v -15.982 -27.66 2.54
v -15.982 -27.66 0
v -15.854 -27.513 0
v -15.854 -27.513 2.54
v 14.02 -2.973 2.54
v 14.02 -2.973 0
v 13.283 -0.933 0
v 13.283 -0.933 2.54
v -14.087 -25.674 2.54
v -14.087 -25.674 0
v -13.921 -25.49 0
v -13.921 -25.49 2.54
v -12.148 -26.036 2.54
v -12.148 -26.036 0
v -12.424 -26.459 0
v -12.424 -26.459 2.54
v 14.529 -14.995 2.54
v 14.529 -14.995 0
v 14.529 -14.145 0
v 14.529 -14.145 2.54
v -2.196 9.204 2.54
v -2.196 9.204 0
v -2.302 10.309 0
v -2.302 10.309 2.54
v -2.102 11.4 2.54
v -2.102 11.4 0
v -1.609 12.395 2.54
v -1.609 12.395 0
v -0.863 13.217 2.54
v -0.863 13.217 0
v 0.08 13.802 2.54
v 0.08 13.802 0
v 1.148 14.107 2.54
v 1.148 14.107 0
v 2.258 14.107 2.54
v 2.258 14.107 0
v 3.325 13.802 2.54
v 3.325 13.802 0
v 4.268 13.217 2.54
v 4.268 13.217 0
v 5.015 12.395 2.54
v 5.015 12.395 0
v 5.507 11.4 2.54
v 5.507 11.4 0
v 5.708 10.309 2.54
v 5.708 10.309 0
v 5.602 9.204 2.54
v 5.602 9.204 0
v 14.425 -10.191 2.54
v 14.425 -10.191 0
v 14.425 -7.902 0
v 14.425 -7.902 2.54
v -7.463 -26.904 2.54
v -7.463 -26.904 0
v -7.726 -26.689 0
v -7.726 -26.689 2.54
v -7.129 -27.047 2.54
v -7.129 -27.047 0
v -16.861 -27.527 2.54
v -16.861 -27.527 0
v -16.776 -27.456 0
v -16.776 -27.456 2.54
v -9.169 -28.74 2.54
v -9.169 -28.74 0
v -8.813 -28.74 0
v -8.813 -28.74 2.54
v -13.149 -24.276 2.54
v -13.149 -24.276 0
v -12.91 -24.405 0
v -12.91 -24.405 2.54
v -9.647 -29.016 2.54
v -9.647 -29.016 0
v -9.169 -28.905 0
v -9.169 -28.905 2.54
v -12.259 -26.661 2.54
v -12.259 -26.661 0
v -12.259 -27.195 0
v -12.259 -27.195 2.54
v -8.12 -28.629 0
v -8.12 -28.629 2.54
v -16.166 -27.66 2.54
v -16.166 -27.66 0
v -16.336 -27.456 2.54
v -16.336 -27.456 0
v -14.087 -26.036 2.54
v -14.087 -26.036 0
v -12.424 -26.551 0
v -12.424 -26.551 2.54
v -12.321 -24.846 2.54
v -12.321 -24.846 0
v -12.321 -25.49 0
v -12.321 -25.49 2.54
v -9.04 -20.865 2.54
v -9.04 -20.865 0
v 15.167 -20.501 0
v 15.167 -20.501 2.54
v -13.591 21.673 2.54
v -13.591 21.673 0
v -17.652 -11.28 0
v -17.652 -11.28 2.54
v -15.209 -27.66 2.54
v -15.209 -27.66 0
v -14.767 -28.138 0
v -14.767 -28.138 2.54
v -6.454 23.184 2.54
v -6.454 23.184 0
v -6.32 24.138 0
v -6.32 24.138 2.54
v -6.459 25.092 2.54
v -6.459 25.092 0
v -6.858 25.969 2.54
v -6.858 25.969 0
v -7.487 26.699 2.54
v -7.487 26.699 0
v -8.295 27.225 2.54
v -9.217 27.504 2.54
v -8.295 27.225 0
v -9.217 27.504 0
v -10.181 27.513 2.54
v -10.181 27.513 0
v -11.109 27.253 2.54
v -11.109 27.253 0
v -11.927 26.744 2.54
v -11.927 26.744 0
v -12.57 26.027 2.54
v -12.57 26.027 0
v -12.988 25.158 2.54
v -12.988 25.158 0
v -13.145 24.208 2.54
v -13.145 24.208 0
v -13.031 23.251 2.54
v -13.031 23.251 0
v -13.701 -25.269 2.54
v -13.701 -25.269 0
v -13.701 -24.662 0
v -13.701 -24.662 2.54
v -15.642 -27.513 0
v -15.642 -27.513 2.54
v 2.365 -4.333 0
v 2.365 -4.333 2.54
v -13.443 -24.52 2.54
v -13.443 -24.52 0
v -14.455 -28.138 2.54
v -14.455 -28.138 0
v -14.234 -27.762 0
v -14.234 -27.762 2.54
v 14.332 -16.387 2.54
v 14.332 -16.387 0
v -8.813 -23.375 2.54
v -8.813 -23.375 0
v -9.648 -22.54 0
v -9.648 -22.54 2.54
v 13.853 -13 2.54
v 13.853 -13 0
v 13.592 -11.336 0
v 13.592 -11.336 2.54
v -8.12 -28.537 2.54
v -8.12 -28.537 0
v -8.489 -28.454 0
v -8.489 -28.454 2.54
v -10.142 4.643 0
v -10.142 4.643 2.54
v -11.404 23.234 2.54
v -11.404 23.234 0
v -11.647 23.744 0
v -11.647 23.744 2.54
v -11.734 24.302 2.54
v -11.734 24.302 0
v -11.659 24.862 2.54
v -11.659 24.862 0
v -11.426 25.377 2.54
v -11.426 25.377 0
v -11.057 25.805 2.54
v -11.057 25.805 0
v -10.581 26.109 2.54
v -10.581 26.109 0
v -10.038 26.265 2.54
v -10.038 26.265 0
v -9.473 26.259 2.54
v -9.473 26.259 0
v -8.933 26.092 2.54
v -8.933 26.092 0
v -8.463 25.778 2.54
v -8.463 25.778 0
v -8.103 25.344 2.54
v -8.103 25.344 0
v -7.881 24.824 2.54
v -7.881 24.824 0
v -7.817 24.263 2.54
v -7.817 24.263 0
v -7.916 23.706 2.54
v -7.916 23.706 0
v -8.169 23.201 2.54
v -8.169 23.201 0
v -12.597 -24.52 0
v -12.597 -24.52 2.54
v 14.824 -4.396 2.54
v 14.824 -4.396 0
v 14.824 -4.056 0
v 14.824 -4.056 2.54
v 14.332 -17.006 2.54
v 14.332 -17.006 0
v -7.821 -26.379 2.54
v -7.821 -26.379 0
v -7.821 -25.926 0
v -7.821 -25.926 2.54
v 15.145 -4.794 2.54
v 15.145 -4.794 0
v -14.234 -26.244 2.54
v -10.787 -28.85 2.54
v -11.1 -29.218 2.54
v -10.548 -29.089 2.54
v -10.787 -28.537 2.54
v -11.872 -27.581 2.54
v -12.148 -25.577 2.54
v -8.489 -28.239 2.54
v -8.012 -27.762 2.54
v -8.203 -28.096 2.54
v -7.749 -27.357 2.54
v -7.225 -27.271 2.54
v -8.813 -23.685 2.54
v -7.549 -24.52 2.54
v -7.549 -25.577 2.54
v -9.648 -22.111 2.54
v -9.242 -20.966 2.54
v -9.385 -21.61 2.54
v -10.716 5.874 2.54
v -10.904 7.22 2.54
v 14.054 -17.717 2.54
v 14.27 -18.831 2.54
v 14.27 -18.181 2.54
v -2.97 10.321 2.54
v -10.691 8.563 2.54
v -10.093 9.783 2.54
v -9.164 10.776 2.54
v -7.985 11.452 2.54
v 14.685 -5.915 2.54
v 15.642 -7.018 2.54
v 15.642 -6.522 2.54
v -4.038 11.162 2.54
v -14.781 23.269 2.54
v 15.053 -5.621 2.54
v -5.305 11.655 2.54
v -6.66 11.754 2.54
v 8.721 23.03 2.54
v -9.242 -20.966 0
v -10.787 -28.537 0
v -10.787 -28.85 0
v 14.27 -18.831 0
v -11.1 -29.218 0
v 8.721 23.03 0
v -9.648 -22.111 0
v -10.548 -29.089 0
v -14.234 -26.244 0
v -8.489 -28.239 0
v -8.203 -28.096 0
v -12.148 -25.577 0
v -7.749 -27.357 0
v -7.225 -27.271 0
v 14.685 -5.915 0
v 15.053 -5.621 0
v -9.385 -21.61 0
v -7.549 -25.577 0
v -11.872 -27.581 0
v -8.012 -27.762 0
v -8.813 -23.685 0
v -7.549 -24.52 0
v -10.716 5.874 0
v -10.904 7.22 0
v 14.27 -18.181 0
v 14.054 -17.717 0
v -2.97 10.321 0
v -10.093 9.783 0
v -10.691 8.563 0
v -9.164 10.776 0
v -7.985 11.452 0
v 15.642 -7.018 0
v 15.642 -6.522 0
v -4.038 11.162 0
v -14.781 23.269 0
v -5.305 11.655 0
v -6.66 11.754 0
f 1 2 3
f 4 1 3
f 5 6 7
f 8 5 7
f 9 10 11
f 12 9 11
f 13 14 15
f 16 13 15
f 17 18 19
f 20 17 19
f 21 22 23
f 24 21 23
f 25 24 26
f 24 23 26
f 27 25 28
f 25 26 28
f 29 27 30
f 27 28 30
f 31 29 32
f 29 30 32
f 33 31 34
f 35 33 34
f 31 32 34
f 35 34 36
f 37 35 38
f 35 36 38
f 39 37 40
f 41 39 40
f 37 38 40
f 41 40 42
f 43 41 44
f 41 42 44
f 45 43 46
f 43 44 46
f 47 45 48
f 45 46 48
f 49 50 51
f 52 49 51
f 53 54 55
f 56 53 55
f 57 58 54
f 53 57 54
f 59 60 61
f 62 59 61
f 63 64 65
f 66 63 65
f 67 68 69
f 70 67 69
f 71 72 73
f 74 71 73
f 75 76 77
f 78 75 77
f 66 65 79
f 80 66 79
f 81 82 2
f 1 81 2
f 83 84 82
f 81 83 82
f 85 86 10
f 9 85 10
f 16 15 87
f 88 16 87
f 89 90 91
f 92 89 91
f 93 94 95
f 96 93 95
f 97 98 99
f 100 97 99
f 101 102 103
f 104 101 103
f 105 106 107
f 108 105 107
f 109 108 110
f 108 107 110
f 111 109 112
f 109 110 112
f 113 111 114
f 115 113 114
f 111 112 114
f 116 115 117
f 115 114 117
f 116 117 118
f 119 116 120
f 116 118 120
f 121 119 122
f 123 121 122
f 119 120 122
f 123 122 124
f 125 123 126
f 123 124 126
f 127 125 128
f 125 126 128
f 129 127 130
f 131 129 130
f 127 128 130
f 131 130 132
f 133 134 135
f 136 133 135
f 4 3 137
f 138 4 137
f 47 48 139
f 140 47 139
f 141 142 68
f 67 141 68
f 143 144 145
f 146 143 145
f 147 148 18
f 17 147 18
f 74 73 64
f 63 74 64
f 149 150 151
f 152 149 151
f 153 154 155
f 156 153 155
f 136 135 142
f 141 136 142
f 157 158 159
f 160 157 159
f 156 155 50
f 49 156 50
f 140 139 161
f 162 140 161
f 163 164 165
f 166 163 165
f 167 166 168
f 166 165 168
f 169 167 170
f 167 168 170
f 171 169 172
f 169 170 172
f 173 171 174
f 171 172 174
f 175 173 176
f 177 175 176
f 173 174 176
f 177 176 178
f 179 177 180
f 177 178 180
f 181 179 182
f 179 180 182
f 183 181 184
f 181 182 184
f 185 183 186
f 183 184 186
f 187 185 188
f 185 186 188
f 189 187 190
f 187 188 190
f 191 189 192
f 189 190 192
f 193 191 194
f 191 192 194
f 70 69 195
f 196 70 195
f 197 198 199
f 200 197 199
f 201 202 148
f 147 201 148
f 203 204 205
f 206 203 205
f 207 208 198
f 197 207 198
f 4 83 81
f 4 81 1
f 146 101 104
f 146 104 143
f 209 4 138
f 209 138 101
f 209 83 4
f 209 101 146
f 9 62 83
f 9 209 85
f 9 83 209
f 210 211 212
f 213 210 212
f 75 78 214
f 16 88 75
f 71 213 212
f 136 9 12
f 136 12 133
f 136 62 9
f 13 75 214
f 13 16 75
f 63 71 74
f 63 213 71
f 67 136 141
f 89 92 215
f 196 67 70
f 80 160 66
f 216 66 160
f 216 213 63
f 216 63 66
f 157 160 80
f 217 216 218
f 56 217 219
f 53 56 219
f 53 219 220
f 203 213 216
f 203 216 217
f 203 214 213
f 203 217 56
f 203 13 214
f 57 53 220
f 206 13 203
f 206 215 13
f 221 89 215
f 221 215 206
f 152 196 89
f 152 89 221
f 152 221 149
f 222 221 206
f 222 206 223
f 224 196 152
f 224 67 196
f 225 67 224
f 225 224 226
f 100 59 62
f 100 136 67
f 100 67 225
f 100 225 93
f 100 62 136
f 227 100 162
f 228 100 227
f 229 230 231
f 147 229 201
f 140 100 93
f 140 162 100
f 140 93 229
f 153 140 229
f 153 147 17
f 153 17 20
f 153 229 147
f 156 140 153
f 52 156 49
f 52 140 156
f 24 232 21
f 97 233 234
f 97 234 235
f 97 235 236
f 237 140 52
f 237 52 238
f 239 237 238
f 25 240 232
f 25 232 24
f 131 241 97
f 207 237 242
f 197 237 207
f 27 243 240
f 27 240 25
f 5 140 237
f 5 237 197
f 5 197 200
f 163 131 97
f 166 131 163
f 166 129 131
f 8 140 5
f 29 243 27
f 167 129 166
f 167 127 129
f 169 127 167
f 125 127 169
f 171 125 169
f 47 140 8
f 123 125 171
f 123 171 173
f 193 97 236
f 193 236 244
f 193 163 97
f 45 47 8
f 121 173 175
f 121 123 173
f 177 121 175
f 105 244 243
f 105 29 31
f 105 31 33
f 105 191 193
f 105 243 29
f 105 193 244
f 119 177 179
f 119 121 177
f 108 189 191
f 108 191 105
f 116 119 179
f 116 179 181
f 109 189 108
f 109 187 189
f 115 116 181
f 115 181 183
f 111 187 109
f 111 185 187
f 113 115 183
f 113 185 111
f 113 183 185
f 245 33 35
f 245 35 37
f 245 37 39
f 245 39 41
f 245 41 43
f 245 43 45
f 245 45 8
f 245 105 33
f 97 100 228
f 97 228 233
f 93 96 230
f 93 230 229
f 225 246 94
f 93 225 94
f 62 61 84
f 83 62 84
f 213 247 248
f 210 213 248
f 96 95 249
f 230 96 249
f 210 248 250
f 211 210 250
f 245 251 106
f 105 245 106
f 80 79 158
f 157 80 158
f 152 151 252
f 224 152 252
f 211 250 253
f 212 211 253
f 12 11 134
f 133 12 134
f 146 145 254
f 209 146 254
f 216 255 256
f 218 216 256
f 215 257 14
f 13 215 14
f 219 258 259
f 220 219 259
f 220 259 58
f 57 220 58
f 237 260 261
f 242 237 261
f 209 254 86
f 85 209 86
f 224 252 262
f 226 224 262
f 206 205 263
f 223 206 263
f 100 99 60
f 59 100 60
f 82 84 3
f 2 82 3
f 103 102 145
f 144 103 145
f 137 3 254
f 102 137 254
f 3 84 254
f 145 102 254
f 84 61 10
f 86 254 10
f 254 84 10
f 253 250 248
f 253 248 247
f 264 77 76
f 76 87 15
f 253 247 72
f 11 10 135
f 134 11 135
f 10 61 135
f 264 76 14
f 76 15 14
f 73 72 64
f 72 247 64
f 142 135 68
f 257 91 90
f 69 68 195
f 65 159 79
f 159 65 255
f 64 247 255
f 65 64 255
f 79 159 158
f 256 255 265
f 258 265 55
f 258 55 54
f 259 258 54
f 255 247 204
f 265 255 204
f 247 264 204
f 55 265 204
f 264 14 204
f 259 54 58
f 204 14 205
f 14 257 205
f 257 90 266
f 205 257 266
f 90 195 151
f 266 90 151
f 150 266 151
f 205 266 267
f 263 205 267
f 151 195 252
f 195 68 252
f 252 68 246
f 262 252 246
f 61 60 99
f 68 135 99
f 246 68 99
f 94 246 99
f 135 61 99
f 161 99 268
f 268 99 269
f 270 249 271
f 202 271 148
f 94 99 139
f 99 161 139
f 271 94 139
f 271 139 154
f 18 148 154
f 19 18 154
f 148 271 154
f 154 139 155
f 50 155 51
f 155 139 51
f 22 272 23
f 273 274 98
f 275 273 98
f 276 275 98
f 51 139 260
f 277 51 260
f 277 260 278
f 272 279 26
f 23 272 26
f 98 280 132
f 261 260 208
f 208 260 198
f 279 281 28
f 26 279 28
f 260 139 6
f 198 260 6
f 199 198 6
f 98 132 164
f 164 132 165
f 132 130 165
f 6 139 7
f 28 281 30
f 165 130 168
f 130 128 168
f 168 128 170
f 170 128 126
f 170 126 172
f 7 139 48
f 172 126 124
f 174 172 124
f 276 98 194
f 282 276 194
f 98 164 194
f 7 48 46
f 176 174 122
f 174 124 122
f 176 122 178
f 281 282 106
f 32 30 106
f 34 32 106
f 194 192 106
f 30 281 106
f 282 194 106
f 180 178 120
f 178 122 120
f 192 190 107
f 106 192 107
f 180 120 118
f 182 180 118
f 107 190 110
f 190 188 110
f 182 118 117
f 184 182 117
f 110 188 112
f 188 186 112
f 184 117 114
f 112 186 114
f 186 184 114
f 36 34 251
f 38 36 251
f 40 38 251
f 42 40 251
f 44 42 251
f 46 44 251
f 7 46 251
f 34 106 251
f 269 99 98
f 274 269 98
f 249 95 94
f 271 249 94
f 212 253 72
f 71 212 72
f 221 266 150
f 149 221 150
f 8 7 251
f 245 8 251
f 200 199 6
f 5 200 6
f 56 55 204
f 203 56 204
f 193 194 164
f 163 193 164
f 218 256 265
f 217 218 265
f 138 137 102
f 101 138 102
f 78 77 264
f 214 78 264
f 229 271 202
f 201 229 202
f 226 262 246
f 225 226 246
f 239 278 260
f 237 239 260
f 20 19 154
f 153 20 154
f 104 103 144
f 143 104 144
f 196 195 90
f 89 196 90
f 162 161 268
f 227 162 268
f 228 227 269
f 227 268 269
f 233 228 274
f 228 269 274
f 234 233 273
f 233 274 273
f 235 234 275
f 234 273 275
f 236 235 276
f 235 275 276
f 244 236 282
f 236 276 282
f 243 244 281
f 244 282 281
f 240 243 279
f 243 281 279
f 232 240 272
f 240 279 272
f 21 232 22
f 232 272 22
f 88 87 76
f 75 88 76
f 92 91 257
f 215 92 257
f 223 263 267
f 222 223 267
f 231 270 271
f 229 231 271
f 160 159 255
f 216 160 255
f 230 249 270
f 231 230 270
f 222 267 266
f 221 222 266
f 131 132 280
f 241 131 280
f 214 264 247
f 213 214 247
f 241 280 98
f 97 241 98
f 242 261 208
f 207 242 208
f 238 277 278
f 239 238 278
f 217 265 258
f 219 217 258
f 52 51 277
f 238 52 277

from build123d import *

# Parameters (mm, degrees)
F1_DEPTH = 2.54


with BuildPart() as f1:
    # F0 (on Top) → F1 (new body)
    with BuildSketch(Plane.XY):
        with BuildLine():
            Line((-13.030899, 23.250838), (-14.7814, 23.26861))
            Line((-14.7814, 23.26861), (-13.591297, 21.67334))
            Line((-13.591297, 21.67334), (-17.65191, -11.280064))
            Line((-17.65191, -11.280064), (-16.861185, -27.526684))
            Line((-16.861185, -27.526684), (-16.776092, -27.455773))
            Line((-16.776092, -27.455773), (-16.336445, -27.455773))
            Line((-16.336445, -27.455773), (-16.166259, -27.660001))
            Line((-16.166259, -27.660001), (-15.981892, -27.660001))
            Line((-15.981892, -27.660001), (-15.854253, -27.512502))
            Line((-15.854253, -27.512502), (-15.64152, -27.512502))
            Line((-15.64152, -27.512502), (-15.208855, -27.660001))
            Line((-15.208855, -27.660001), (-14.767447, -28.138192))
            Line((-14.767447, -28.138192), (-14.454785, -28.138192))
            Line((-14.454785, -28.138192), (-14.234081, -27.762407))
            Line((-14.234081, -27.762407), (-14.234081, -26.243819))
            Line((-14.234081, -26.243819), (-14.086945, -26.03608))
            Line((-14.086945, -26.03608), (-14.086945, -25.673669))
            Line((-14.086945, -25.673669), (-13.921417, -25.489749))
            Line((-13.921417, -25.489749), (-13.700713, -25.269045))
            Line((-13.700713, -25.269045), (-13.700713, -24.882814))
            Line((-13.700713, -24.882814), (-13.700713, -24.662109))
            Line((-13.700713, -24.662109), (-13.443226, -24.519552))
            Line((-13.443226, -24.519552), (-13.148954, -24.275878))
            Line((-13.148954, -24.275878), (-12.909858, -24.404623))
            Line((-12.909858, -24.404623), (-12.597195, -24.519552))
            Line((-12.597195, -24.519552), (-12.321316, -24.84603))
            Line((-12.321316, -24.84603), (-12.321316, -25.489749))
            Line((-12.321316, -25.489749), (-12.148302, -25.576962))
            Line((-12.148302, -25.576962), (-12.148302, -26.03608))
            Line((-12.148302, -26.03608), (-12.424181, -26.459094))
            Line((-12.424181, -26.459094), (-12.424181, -26.551055))
            Line((-12.424181, -26.551055), (-12.258654, -26.661407))
            Line((-12.258654, -26.661407), (-12.258654, -27.194774))
            Line((-12.258654, -27.194774), (-11.872422, -27.581004))
            Line((-11.872422, -27.581004), (-10.787295, -28.537387))
            Line((-10.787295, -28.537387), (-10.787295, -28.850051))
            Line((-10.787295, -28.850051), (-11.099959, -29.217891))
            Line((-11.099959, -29.217891), (-10.5482, -29.089147))
            Line((-10.5482, -29.089147), (-9.646993, -29.015578))
            Line((-9.646993, -29.015578), (-9.168802, -28.905228))
            Line((-9.168802, -28.905228), (-9.168802, -28.7397))
            Line((-9.168802, -28.7397), (-8.812965, -28.7397))
            Line((-8.812965, -28.7397), (-8.12046, -28.629348))
            Line((-8.12046, -28.629348), (-8.12046, -28.537387))
            Line((-8.12046, -28.537387), (-8.488759, -28.454099))
            Line((-8.488759, -28.454099), (-8.488759, -28.239436))
            Line((-8.488759, -28.239436), (-8.202543, -28.096328))
            Line((-8.202543, -28.096328), (-8.01173, -27.762407))
            Line((-8.01173, -27.762407), (-7.749365, -27.356932))
            Line((-7.749365, -27.356932), (-7.225457, -27.271397))
            Line((-7.225457, -27.271397), (-7.129228, -27.046863))
            Line((-7.129228, -27.046863), (-7.463148, -26.903754))
            Line((-7.463148, -26.903754), (-7.725514, -26.689092))
            Line((-7.725514, -26.689092), (-7.820919, -26.379023))
            Line((-7.820919, -26.379023), (-7.820919, -25.925847))
            Line((-7.820919, -25.925847), (-7.548839, -25.576962))
            Line((-7.548839, -25.576962), (-7.548839, -24.519552))
            Line((-7.548839, -24.519552), (-8.812965, -23.684751))
            Line((-8.812965, -23.684751), (-8.812965, -23.374682))
            Line((-8.812965, -23.374682), (-9.647765, -22.539882))
            Line((-9.647765, -22.539882), (-9.647765, -22.110555))
            Line((-9.647765, -22.110555), (-9.3854, -21.609675))
            Line((-9.3854, -21.609675), (-9.242291, -20.965688))
            Line((-9.242291, -20.965688), (-9.039888, -20.864896))
            Line((-9.039888, -20.864896), (15.167137, -20.501176))
            Line((15.167137, -20.501176), (14.270123, -18.830877))
            Line((14.270123, -18.830877), (14.270123, -18.181315))
            Line((14.270123, -18.181315), (14.053603, -17.717343))
            Line((14.053603, -17.717343), (14.331986, -17.005919))
            Line((14.331986, -17.005919), (14.331986, -16.387288))
            Line((14.331986, -16.387288), (14.528844, -14.995371))
            Line((14.528844, -14.995371), (14.528844, -14.144757))
            Line((14.528844, -14.144757), (13.852579, -13.000309))
            Line((13.852579, -13.000309), (13.592477, -11.335658))
            Line((13.592477, -11.335658), (14.424803, -10.19121))
            Line((14.424803, -10.19121), (14.424803, -7.902314))
            Line((14.424803, -7.902314), (15.641566, -7.017968))
            Line((15.641566, -7.017968), (15.641566, -6.522429))
            Line((15.641566, -6.522429), (14.685183, -5.915494))
            Line((14.685183, -5.915494), (15.053023, -5.621222))
            Line((15.053023, -5.621222), (15.144982, -4.793584))
            Line((15.144982, -4.793584), (14.8241, -4.396295))
            Line((14.8241, -4.396295), (14.8241, -4.056049))
            Line((14.8241, -4.056049), (14.019881, -2.973447))
            Line((14.019881, -2.973447), (13.283001, -0.933324))
            Line((13.283001, -0.933324), (8.720862, 23.029998))
            Line((8.720862, 23.029998), (-6.454206, 23.184066))
            ThreePointArc((-6.454206, 23.184066), (-9.698639, 27.542757), (-13.030899, 23.250838))
        make_face()
        with BuildLine():
            ThreePointArc((-2.196216, 9.203731), (1.702882, 14.145155), (5.601981, 9.203731))
            Line((5.601981, 9.203731), (2.364994, -4.332762))
            Line((2.364994, -4.332762), (-10.141549, 4.642522))
            ThreePointArc((-10.141549, 4.642522), (-8.599849, 11.157714), (-2.196216, 9.203731))
        make_face(mode=Mode.SUBTRACT)
        with BuildLine():
            ThreePointArc((-11.403755, 23.234318), (-9.755181, 26.28218), (-8.168829, 23.201475))
            Line((-8.168829, 23.201475), (-11.403755, 23.234318))
        make_face(mode=Mode.SUBTRACT)
    extrude(amount=F1_DEPTH)


solid = f1.part
